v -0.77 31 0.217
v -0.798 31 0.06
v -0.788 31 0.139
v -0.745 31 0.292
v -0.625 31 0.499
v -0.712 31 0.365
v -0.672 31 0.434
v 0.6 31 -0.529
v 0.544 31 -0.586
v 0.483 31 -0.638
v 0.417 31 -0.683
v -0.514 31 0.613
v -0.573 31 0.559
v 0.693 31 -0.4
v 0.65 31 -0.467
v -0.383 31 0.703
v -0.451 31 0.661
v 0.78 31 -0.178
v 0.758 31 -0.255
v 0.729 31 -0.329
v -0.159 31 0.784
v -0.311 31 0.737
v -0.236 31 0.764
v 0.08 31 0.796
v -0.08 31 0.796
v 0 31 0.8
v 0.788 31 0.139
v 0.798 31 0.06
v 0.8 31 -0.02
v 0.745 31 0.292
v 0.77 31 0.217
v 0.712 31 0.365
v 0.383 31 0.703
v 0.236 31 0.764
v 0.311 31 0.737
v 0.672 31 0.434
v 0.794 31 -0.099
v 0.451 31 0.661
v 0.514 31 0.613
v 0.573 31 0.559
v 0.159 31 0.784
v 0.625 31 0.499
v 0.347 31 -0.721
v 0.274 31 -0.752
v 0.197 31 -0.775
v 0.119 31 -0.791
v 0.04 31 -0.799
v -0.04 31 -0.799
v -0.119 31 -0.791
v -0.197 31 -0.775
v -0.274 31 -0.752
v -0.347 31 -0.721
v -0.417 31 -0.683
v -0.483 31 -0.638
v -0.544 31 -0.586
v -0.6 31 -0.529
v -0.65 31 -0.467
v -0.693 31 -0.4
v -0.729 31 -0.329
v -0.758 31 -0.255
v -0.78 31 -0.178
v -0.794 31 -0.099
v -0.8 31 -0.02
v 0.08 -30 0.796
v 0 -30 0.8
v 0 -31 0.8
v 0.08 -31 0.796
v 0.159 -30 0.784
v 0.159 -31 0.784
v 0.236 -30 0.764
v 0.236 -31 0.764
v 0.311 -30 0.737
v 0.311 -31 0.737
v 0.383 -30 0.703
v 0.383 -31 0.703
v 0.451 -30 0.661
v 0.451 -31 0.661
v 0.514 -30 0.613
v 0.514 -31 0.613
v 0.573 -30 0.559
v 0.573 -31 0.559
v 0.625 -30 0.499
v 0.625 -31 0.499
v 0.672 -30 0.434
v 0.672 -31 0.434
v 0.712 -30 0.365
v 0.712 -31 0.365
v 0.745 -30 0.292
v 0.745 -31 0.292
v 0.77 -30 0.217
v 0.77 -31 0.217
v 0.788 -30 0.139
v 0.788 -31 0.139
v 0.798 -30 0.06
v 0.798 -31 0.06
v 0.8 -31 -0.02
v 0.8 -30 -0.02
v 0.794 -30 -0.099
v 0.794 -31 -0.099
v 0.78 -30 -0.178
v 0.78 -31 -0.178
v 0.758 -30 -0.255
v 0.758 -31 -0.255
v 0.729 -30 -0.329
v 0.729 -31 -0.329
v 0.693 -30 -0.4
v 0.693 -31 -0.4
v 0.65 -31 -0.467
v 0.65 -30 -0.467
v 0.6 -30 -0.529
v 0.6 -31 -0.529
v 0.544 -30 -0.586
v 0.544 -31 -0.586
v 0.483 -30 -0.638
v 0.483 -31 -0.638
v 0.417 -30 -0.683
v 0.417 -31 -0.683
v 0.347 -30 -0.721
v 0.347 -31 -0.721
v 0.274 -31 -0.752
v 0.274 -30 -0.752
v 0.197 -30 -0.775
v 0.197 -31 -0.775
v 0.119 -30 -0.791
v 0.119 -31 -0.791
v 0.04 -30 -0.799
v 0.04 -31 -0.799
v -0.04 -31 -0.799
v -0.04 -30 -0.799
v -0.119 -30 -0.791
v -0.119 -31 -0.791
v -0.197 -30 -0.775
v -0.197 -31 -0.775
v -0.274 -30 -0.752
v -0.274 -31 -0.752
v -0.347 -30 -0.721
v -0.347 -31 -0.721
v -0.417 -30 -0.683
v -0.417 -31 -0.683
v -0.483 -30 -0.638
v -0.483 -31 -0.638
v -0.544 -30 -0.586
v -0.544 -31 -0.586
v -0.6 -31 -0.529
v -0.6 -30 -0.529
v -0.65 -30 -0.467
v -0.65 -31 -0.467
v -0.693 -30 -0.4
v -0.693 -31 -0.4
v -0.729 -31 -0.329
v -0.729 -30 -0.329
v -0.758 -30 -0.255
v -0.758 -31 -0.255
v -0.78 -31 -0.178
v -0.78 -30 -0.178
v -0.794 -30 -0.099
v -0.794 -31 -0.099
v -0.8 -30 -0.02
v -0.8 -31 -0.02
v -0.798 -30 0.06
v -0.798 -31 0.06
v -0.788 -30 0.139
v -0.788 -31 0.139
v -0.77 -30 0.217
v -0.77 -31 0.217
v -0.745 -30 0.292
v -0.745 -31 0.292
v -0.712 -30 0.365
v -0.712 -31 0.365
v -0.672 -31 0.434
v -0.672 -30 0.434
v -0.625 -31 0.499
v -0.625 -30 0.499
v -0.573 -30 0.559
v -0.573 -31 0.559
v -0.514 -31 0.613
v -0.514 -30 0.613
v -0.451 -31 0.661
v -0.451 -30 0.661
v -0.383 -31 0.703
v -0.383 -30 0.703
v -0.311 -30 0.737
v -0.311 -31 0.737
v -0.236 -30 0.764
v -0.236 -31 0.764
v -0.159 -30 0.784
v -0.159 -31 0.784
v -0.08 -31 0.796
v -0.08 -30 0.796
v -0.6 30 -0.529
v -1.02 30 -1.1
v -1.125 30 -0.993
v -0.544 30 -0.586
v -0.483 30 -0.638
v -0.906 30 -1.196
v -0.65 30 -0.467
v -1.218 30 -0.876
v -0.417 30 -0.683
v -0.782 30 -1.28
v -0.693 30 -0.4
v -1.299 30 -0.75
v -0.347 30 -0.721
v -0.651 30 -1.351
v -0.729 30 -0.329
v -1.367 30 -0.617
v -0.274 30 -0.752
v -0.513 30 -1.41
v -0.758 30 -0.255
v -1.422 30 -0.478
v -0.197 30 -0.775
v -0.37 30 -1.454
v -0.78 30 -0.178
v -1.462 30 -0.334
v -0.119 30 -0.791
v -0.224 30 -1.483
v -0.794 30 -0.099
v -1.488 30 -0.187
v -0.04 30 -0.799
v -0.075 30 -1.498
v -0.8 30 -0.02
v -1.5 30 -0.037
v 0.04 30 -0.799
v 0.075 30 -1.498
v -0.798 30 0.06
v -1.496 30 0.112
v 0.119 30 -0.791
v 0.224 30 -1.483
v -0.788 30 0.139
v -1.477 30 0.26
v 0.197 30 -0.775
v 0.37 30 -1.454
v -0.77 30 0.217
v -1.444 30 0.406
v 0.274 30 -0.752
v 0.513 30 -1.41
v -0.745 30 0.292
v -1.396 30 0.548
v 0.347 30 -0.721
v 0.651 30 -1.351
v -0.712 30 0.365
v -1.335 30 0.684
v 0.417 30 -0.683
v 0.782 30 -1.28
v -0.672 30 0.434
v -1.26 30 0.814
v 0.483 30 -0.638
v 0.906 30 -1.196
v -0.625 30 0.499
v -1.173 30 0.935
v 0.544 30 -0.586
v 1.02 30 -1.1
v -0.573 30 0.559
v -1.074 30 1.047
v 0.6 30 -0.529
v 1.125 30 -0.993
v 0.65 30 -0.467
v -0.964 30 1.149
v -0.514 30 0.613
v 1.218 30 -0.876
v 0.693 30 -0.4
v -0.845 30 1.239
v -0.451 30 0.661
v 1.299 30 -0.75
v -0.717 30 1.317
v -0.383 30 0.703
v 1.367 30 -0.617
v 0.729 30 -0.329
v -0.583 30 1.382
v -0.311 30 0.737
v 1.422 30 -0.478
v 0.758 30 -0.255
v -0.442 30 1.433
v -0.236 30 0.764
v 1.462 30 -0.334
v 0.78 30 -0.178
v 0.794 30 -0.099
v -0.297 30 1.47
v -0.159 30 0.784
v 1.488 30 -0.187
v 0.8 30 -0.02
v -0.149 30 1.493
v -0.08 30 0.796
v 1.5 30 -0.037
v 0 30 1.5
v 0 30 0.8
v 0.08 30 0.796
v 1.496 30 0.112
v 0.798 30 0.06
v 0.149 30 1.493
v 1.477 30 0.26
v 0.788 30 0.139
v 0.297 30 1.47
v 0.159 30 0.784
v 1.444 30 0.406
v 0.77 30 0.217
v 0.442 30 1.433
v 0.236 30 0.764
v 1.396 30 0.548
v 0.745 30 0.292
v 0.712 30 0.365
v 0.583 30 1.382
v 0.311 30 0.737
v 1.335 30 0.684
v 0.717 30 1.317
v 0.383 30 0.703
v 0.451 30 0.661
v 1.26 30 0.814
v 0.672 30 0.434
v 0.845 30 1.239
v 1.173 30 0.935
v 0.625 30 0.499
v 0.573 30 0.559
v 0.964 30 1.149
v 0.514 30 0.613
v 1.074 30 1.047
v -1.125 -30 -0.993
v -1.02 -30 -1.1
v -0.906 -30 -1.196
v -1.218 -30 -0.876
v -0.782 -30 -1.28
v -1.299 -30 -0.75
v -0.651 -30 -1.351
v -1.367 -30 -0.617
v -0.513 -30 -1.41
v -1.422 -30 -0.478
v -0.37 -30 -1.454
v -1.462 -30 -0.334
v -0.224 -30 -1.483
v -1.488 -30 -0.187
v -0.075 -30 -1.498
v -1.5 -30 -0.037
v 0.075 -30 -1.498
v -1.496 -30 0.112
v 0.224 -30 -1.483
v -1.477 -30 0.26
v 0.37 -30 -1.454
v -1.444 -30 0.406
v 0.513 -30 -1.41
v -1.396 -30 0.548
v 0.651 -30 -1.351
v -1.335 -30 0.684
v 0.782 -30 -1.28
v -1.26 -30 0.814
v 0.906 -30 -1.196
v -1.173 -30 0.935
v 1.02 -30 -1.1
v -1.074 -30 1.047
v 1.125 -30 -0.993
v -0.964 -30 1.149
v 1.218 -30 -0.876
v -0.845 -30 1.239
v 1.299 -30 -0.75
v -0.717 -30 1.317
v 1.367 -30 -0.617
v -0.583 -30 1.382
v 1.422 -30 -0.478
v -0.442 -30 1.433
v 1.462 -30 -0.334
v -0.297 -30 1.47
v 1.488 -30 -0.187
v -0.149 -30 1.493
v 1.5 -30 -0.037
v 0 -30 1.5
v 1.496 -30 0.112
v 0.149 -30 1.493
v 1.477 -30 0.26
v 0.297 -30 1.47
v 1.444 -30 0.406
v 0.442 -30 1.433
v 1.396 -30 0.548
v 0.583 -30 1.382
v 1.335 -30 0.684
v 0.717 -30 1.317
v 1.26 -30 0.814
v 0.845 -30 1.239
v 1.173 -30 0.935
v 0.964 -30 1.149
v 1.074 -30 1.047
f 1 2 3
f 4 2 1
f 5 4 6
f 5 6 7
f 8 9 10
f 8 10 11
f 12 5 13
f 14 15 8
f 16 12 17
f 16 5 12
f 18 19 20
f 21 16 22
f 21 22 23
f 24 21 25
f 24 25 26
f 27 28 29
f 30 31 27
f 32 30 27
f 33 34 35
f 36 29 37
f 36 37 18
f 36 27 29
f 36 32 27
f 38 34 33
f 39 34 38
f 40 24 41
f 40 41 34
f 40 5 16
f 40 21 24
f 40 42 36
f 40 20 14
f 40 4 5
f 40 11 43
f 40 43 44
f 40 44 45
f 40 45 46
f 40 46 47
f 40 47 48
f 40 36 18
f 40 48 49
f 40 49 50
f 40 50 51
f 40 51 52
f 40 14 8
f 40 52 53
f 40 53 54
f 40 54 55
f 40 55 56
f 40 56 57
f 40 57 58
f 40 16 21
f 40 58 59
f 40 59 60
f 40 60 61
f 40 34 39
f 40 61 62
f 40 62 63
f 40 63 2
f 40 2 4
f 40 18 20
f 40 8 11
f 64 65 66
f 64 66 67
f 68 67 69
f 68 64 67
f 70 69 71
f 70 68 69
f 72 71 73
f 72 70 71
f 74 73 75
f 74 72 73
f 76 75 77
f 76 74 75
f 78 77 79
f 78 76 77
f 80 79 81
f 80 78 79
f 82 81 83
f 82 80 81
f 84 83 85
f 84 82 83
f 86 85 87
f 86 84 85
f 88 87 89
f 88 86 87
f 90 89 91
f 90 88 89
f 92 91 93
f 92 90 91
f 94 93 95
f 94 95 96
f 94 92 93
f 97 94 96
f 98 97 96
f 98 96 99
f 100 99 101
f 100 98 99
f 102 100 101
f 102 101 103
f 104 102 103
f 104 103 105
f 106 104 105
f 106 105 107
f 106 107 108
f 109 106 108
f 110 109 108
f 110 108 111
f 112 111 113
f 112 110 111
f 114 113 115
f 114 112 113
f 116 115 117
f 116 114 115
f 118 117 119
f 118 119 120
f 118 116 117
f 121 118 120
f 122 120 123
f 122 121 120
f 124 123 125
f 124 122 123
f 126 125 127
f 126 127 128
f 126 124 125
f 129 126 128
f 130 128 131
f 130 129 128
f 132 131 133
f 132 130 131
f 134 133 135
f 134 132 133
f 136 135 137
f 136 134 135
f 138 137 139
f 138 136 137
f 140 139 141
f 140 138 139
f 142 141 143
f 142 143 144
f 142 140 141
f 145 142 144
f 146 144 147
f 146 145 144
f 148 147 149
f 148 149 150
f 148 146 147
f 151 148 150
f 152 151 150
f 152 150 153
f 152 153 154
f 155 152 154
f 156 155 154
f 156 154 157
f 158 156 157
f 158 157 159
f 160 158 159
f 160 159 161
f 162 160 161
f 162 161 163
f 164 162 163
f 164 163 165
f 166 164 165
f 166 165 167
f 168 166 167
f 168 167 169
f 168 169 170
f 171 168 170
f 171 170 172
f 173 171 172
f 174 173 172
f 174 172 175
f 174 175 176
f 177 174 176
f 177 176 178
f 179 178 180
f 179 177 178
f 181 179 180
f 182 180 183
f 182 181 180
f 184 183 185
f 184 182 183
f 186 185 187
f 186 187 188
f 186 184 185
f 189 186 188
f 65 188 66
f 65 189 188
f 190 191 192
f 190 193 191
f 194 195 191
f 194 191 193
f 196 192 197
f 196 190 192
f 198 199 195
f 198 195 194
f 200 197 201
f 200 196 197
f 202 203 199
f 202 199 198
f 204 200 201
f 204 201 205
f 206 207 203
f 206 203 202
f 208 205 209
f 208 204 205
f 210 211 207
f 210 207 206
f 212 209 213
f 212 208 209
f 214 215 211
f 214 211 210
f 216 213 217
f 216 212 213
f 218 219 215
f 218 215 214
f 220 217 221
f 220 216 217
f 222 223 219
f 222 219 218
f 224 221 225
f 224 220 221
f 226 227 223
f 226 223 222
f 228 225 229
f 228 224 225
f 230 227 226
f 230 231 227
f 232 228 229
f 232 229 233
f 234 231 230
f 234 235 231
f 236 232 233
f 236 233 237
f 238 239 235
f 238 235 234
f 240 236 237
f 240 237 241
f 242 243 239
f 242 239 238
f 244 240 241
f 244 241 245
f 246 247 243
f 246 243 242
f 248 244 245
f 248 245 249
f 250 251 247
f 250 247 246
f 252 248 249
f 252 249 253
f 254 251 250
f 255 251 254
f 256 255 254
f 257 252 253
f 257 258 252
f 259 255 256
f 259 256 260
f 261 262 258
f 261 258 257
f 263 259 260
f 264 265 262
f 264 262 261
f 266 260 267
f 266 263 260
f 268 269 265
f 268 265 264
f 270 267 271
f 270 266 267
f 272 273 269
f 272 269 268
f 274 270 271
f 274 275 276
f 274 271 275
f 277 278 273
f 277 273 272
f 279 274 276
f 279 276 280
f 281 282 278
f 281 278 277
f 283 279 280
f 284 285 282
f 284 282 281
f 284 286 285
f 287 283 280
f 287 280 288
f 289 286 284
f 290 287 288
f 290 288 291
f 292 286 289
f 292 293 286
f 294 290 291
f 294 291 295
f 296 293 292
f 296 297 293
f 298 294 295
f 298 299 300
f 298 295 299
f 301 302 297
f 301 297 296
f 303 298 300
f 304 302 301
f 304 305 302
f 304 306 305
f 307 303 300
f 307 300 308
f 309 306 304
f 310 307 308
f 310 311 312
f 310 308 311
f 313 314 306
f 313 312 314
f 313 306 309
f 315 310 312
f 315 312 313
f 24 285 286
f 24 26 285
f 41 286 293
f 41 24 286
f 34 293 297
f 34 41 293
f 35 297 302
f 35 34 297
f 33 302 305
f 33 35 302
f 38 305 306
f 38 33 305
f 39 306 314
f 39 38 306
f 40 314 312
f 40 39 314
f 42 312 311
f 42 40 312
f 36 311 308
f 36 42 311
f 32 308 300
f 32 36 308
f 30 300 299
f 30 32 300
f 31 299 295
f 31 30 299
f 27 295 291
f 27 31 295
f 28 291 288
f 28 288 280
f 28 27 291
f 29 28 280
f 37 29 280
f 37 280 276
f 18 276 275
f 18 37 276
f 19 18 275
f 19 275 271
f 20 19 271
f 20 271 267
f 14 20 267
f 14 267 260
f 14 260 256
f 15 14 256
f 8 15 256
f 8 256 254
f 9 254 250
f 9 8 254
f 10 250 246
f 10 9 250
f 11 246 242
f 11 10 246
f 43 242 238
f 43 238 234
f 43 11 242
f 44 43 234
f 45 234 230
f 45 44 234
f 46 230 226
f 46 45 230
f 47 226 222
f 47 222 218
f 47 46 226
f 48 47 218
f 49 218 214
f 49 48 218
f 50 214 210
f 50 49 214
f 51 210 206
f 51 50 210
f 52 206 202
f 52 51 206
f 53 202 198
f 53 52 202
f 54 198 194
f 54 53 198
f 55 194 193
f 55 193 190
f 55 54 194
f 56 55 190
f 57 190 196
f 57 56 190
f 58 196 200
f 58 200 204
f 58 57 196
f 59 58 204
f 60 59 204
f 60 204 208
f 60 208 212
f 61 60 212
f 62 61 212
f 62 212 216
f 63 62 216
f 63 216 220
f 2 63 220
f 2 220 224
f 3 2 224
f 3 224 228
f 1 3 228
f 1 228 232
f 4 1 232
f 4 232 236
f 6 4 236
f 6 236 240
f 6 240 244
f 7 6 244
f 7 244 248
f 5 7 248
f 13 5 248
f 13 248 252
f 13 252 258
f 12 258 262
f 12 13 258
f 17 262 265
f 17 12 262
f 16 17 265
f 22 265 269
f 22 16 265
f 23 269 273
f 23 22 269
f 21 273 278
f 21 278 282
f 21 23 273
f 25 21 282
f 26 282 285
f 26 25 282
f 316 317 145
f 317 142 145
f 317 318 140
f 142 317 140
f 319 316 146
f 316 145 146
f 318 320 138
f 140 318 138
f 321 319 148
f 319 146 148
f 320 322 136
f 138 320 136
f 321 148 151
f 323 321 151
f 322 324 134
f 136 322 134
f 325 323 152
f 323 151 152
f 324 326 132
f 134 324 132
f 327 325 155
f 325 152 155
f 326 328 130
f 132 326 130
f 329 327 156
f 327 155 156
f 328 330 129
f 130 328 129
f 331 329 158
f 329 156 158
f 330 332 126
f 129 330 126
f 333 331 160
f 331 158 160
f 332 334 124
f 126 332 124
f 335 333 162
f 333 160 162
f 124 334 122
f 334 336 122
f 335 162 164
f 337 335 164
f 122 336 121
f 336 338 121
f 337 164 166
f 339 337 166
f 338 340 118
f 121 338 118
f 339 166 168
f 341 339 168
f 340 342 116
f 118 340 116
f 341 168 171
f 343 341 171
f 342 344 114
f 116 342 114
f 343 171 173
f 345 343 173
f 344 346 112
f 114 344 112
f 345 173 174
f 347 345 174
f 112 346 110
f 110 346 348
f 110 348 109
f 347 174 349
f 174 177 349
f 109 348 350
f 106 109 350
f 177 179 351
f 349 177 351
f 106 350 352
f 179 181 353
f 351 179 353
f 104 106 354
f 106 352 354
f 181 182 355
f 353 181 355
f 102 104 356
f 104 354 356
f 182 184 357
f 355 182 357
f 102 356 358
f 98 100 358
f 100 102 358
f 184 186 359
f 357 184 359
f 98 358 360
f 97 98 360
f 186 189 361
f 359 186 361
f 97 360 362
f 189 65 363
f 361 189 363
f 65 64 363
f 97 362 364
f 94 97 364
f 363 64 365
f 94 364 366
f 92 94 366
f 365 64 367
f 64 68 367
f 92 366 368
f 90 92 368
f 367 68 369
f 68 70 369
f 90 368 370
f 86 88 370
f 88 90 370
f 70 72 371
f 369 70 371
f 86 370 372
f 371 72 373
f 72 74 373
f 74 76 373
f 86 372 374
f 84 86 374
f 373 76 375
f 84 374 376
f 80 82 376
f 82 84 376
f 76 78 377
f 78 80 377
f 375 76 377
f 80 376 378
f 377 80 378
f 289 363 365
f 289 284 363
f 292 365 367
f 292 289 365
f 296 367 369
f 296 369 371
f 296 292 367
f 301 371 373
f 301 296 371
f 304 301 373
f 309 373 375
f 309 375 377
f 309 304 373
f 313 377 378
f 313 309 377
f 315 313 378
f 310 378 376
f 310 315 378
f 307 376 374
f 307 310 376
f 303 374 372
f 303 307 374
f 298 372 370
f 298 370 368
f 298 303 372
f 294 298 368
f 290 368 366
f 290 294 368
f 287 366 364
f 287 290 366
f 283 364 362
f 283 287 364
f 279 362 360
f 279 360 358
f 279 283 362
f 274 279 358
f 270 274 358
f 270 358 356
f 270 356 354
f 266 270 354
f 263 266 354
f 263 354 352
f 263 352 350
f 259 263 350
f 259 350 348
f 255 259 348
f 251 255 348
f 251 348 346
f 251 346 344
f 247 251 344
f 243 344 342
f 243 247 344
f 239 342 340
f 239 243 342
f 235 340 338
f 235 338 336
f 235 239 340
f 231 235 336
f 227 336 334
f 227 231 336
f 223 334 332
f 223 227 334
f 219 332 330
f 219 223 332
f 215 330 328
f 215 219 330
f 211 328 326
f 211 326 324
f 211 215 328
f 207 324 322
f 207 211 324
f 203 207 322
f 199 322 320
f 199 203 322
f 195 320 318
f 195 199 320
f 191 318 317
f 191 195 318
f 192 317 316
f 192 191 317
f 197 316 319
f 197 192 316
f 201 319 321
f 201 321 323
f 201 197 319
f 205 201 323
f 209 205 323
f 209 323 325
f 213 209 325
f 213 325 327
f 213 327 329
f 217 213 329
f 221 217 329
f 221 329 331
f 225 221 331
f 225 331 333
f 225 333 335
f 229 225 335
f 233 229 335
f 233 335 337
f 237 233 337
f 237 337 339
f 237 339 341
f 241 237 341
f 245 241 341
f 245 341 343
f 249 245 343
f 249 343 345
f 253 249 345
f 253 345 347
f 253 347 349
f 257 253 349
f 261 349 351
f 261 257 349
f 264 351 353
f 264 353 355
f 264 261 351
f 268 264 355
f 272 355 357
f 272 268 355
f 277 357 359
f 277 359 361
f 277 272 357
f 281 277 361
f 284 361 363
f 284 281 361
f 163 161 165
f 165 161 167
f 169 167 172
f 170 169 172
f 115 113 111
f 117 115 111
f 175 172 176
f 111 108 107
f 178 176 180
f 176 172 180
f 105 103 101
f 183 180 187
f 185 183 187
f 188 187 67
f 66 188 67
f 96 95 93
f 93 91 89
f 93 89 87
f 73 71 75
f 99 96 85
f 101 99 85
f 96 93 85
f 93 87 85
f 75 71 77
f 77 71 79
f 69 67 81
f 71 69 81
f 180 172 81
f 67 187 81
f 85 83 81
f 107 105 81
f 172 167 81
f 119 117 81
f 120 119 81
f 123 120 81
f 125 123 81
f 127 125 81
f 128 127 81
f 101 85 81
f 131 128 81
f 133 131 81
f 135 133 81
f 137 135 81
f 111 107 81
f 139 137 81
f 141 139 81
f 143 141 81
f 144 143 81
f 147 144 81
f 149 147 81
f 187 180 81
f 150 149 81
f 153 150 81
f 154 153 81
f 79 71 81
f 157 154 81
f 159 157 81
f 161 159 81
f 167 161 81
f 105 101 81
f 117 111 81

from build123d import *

# Parameters (mm, degrees)
SKETCH_1_R      = 0.8
EXTRUDE_1_DEPTH = 31
SKETCH_2_R      = 1.5
EXTRUDE_2_DEPTH = 30


with BuildPart() as part:
    # 草图1 → 凸台-拉伸1 (new, symmetric)
    with BuildSketch(Plane(origin=(0, 0, 0), x_dir=(1, 0, 0), z_dir=(0, 1, 0))):
        with Locations(Location((0, 0, 0), (0, 0, 270))):
            Circle(SKETCH_1_R)
    extrude(amount=EXTRUDE_1_DEPTH, both=True)

    # 草图2 → 凸台-拉伸2 (add, symmetric)
    with BuildSketch(Plane(origin=(0, 0, 0), x_dir=(1, 0, 0), z_dir=(0, 1, 0))):
        with Locations(Location((0, 0, 0), (0, 0, 270))):
            Circle(SKETCH_2_R)
    extrude(amount=EXTRUDE_2_DEPTH, both=True)


solid = part.part
